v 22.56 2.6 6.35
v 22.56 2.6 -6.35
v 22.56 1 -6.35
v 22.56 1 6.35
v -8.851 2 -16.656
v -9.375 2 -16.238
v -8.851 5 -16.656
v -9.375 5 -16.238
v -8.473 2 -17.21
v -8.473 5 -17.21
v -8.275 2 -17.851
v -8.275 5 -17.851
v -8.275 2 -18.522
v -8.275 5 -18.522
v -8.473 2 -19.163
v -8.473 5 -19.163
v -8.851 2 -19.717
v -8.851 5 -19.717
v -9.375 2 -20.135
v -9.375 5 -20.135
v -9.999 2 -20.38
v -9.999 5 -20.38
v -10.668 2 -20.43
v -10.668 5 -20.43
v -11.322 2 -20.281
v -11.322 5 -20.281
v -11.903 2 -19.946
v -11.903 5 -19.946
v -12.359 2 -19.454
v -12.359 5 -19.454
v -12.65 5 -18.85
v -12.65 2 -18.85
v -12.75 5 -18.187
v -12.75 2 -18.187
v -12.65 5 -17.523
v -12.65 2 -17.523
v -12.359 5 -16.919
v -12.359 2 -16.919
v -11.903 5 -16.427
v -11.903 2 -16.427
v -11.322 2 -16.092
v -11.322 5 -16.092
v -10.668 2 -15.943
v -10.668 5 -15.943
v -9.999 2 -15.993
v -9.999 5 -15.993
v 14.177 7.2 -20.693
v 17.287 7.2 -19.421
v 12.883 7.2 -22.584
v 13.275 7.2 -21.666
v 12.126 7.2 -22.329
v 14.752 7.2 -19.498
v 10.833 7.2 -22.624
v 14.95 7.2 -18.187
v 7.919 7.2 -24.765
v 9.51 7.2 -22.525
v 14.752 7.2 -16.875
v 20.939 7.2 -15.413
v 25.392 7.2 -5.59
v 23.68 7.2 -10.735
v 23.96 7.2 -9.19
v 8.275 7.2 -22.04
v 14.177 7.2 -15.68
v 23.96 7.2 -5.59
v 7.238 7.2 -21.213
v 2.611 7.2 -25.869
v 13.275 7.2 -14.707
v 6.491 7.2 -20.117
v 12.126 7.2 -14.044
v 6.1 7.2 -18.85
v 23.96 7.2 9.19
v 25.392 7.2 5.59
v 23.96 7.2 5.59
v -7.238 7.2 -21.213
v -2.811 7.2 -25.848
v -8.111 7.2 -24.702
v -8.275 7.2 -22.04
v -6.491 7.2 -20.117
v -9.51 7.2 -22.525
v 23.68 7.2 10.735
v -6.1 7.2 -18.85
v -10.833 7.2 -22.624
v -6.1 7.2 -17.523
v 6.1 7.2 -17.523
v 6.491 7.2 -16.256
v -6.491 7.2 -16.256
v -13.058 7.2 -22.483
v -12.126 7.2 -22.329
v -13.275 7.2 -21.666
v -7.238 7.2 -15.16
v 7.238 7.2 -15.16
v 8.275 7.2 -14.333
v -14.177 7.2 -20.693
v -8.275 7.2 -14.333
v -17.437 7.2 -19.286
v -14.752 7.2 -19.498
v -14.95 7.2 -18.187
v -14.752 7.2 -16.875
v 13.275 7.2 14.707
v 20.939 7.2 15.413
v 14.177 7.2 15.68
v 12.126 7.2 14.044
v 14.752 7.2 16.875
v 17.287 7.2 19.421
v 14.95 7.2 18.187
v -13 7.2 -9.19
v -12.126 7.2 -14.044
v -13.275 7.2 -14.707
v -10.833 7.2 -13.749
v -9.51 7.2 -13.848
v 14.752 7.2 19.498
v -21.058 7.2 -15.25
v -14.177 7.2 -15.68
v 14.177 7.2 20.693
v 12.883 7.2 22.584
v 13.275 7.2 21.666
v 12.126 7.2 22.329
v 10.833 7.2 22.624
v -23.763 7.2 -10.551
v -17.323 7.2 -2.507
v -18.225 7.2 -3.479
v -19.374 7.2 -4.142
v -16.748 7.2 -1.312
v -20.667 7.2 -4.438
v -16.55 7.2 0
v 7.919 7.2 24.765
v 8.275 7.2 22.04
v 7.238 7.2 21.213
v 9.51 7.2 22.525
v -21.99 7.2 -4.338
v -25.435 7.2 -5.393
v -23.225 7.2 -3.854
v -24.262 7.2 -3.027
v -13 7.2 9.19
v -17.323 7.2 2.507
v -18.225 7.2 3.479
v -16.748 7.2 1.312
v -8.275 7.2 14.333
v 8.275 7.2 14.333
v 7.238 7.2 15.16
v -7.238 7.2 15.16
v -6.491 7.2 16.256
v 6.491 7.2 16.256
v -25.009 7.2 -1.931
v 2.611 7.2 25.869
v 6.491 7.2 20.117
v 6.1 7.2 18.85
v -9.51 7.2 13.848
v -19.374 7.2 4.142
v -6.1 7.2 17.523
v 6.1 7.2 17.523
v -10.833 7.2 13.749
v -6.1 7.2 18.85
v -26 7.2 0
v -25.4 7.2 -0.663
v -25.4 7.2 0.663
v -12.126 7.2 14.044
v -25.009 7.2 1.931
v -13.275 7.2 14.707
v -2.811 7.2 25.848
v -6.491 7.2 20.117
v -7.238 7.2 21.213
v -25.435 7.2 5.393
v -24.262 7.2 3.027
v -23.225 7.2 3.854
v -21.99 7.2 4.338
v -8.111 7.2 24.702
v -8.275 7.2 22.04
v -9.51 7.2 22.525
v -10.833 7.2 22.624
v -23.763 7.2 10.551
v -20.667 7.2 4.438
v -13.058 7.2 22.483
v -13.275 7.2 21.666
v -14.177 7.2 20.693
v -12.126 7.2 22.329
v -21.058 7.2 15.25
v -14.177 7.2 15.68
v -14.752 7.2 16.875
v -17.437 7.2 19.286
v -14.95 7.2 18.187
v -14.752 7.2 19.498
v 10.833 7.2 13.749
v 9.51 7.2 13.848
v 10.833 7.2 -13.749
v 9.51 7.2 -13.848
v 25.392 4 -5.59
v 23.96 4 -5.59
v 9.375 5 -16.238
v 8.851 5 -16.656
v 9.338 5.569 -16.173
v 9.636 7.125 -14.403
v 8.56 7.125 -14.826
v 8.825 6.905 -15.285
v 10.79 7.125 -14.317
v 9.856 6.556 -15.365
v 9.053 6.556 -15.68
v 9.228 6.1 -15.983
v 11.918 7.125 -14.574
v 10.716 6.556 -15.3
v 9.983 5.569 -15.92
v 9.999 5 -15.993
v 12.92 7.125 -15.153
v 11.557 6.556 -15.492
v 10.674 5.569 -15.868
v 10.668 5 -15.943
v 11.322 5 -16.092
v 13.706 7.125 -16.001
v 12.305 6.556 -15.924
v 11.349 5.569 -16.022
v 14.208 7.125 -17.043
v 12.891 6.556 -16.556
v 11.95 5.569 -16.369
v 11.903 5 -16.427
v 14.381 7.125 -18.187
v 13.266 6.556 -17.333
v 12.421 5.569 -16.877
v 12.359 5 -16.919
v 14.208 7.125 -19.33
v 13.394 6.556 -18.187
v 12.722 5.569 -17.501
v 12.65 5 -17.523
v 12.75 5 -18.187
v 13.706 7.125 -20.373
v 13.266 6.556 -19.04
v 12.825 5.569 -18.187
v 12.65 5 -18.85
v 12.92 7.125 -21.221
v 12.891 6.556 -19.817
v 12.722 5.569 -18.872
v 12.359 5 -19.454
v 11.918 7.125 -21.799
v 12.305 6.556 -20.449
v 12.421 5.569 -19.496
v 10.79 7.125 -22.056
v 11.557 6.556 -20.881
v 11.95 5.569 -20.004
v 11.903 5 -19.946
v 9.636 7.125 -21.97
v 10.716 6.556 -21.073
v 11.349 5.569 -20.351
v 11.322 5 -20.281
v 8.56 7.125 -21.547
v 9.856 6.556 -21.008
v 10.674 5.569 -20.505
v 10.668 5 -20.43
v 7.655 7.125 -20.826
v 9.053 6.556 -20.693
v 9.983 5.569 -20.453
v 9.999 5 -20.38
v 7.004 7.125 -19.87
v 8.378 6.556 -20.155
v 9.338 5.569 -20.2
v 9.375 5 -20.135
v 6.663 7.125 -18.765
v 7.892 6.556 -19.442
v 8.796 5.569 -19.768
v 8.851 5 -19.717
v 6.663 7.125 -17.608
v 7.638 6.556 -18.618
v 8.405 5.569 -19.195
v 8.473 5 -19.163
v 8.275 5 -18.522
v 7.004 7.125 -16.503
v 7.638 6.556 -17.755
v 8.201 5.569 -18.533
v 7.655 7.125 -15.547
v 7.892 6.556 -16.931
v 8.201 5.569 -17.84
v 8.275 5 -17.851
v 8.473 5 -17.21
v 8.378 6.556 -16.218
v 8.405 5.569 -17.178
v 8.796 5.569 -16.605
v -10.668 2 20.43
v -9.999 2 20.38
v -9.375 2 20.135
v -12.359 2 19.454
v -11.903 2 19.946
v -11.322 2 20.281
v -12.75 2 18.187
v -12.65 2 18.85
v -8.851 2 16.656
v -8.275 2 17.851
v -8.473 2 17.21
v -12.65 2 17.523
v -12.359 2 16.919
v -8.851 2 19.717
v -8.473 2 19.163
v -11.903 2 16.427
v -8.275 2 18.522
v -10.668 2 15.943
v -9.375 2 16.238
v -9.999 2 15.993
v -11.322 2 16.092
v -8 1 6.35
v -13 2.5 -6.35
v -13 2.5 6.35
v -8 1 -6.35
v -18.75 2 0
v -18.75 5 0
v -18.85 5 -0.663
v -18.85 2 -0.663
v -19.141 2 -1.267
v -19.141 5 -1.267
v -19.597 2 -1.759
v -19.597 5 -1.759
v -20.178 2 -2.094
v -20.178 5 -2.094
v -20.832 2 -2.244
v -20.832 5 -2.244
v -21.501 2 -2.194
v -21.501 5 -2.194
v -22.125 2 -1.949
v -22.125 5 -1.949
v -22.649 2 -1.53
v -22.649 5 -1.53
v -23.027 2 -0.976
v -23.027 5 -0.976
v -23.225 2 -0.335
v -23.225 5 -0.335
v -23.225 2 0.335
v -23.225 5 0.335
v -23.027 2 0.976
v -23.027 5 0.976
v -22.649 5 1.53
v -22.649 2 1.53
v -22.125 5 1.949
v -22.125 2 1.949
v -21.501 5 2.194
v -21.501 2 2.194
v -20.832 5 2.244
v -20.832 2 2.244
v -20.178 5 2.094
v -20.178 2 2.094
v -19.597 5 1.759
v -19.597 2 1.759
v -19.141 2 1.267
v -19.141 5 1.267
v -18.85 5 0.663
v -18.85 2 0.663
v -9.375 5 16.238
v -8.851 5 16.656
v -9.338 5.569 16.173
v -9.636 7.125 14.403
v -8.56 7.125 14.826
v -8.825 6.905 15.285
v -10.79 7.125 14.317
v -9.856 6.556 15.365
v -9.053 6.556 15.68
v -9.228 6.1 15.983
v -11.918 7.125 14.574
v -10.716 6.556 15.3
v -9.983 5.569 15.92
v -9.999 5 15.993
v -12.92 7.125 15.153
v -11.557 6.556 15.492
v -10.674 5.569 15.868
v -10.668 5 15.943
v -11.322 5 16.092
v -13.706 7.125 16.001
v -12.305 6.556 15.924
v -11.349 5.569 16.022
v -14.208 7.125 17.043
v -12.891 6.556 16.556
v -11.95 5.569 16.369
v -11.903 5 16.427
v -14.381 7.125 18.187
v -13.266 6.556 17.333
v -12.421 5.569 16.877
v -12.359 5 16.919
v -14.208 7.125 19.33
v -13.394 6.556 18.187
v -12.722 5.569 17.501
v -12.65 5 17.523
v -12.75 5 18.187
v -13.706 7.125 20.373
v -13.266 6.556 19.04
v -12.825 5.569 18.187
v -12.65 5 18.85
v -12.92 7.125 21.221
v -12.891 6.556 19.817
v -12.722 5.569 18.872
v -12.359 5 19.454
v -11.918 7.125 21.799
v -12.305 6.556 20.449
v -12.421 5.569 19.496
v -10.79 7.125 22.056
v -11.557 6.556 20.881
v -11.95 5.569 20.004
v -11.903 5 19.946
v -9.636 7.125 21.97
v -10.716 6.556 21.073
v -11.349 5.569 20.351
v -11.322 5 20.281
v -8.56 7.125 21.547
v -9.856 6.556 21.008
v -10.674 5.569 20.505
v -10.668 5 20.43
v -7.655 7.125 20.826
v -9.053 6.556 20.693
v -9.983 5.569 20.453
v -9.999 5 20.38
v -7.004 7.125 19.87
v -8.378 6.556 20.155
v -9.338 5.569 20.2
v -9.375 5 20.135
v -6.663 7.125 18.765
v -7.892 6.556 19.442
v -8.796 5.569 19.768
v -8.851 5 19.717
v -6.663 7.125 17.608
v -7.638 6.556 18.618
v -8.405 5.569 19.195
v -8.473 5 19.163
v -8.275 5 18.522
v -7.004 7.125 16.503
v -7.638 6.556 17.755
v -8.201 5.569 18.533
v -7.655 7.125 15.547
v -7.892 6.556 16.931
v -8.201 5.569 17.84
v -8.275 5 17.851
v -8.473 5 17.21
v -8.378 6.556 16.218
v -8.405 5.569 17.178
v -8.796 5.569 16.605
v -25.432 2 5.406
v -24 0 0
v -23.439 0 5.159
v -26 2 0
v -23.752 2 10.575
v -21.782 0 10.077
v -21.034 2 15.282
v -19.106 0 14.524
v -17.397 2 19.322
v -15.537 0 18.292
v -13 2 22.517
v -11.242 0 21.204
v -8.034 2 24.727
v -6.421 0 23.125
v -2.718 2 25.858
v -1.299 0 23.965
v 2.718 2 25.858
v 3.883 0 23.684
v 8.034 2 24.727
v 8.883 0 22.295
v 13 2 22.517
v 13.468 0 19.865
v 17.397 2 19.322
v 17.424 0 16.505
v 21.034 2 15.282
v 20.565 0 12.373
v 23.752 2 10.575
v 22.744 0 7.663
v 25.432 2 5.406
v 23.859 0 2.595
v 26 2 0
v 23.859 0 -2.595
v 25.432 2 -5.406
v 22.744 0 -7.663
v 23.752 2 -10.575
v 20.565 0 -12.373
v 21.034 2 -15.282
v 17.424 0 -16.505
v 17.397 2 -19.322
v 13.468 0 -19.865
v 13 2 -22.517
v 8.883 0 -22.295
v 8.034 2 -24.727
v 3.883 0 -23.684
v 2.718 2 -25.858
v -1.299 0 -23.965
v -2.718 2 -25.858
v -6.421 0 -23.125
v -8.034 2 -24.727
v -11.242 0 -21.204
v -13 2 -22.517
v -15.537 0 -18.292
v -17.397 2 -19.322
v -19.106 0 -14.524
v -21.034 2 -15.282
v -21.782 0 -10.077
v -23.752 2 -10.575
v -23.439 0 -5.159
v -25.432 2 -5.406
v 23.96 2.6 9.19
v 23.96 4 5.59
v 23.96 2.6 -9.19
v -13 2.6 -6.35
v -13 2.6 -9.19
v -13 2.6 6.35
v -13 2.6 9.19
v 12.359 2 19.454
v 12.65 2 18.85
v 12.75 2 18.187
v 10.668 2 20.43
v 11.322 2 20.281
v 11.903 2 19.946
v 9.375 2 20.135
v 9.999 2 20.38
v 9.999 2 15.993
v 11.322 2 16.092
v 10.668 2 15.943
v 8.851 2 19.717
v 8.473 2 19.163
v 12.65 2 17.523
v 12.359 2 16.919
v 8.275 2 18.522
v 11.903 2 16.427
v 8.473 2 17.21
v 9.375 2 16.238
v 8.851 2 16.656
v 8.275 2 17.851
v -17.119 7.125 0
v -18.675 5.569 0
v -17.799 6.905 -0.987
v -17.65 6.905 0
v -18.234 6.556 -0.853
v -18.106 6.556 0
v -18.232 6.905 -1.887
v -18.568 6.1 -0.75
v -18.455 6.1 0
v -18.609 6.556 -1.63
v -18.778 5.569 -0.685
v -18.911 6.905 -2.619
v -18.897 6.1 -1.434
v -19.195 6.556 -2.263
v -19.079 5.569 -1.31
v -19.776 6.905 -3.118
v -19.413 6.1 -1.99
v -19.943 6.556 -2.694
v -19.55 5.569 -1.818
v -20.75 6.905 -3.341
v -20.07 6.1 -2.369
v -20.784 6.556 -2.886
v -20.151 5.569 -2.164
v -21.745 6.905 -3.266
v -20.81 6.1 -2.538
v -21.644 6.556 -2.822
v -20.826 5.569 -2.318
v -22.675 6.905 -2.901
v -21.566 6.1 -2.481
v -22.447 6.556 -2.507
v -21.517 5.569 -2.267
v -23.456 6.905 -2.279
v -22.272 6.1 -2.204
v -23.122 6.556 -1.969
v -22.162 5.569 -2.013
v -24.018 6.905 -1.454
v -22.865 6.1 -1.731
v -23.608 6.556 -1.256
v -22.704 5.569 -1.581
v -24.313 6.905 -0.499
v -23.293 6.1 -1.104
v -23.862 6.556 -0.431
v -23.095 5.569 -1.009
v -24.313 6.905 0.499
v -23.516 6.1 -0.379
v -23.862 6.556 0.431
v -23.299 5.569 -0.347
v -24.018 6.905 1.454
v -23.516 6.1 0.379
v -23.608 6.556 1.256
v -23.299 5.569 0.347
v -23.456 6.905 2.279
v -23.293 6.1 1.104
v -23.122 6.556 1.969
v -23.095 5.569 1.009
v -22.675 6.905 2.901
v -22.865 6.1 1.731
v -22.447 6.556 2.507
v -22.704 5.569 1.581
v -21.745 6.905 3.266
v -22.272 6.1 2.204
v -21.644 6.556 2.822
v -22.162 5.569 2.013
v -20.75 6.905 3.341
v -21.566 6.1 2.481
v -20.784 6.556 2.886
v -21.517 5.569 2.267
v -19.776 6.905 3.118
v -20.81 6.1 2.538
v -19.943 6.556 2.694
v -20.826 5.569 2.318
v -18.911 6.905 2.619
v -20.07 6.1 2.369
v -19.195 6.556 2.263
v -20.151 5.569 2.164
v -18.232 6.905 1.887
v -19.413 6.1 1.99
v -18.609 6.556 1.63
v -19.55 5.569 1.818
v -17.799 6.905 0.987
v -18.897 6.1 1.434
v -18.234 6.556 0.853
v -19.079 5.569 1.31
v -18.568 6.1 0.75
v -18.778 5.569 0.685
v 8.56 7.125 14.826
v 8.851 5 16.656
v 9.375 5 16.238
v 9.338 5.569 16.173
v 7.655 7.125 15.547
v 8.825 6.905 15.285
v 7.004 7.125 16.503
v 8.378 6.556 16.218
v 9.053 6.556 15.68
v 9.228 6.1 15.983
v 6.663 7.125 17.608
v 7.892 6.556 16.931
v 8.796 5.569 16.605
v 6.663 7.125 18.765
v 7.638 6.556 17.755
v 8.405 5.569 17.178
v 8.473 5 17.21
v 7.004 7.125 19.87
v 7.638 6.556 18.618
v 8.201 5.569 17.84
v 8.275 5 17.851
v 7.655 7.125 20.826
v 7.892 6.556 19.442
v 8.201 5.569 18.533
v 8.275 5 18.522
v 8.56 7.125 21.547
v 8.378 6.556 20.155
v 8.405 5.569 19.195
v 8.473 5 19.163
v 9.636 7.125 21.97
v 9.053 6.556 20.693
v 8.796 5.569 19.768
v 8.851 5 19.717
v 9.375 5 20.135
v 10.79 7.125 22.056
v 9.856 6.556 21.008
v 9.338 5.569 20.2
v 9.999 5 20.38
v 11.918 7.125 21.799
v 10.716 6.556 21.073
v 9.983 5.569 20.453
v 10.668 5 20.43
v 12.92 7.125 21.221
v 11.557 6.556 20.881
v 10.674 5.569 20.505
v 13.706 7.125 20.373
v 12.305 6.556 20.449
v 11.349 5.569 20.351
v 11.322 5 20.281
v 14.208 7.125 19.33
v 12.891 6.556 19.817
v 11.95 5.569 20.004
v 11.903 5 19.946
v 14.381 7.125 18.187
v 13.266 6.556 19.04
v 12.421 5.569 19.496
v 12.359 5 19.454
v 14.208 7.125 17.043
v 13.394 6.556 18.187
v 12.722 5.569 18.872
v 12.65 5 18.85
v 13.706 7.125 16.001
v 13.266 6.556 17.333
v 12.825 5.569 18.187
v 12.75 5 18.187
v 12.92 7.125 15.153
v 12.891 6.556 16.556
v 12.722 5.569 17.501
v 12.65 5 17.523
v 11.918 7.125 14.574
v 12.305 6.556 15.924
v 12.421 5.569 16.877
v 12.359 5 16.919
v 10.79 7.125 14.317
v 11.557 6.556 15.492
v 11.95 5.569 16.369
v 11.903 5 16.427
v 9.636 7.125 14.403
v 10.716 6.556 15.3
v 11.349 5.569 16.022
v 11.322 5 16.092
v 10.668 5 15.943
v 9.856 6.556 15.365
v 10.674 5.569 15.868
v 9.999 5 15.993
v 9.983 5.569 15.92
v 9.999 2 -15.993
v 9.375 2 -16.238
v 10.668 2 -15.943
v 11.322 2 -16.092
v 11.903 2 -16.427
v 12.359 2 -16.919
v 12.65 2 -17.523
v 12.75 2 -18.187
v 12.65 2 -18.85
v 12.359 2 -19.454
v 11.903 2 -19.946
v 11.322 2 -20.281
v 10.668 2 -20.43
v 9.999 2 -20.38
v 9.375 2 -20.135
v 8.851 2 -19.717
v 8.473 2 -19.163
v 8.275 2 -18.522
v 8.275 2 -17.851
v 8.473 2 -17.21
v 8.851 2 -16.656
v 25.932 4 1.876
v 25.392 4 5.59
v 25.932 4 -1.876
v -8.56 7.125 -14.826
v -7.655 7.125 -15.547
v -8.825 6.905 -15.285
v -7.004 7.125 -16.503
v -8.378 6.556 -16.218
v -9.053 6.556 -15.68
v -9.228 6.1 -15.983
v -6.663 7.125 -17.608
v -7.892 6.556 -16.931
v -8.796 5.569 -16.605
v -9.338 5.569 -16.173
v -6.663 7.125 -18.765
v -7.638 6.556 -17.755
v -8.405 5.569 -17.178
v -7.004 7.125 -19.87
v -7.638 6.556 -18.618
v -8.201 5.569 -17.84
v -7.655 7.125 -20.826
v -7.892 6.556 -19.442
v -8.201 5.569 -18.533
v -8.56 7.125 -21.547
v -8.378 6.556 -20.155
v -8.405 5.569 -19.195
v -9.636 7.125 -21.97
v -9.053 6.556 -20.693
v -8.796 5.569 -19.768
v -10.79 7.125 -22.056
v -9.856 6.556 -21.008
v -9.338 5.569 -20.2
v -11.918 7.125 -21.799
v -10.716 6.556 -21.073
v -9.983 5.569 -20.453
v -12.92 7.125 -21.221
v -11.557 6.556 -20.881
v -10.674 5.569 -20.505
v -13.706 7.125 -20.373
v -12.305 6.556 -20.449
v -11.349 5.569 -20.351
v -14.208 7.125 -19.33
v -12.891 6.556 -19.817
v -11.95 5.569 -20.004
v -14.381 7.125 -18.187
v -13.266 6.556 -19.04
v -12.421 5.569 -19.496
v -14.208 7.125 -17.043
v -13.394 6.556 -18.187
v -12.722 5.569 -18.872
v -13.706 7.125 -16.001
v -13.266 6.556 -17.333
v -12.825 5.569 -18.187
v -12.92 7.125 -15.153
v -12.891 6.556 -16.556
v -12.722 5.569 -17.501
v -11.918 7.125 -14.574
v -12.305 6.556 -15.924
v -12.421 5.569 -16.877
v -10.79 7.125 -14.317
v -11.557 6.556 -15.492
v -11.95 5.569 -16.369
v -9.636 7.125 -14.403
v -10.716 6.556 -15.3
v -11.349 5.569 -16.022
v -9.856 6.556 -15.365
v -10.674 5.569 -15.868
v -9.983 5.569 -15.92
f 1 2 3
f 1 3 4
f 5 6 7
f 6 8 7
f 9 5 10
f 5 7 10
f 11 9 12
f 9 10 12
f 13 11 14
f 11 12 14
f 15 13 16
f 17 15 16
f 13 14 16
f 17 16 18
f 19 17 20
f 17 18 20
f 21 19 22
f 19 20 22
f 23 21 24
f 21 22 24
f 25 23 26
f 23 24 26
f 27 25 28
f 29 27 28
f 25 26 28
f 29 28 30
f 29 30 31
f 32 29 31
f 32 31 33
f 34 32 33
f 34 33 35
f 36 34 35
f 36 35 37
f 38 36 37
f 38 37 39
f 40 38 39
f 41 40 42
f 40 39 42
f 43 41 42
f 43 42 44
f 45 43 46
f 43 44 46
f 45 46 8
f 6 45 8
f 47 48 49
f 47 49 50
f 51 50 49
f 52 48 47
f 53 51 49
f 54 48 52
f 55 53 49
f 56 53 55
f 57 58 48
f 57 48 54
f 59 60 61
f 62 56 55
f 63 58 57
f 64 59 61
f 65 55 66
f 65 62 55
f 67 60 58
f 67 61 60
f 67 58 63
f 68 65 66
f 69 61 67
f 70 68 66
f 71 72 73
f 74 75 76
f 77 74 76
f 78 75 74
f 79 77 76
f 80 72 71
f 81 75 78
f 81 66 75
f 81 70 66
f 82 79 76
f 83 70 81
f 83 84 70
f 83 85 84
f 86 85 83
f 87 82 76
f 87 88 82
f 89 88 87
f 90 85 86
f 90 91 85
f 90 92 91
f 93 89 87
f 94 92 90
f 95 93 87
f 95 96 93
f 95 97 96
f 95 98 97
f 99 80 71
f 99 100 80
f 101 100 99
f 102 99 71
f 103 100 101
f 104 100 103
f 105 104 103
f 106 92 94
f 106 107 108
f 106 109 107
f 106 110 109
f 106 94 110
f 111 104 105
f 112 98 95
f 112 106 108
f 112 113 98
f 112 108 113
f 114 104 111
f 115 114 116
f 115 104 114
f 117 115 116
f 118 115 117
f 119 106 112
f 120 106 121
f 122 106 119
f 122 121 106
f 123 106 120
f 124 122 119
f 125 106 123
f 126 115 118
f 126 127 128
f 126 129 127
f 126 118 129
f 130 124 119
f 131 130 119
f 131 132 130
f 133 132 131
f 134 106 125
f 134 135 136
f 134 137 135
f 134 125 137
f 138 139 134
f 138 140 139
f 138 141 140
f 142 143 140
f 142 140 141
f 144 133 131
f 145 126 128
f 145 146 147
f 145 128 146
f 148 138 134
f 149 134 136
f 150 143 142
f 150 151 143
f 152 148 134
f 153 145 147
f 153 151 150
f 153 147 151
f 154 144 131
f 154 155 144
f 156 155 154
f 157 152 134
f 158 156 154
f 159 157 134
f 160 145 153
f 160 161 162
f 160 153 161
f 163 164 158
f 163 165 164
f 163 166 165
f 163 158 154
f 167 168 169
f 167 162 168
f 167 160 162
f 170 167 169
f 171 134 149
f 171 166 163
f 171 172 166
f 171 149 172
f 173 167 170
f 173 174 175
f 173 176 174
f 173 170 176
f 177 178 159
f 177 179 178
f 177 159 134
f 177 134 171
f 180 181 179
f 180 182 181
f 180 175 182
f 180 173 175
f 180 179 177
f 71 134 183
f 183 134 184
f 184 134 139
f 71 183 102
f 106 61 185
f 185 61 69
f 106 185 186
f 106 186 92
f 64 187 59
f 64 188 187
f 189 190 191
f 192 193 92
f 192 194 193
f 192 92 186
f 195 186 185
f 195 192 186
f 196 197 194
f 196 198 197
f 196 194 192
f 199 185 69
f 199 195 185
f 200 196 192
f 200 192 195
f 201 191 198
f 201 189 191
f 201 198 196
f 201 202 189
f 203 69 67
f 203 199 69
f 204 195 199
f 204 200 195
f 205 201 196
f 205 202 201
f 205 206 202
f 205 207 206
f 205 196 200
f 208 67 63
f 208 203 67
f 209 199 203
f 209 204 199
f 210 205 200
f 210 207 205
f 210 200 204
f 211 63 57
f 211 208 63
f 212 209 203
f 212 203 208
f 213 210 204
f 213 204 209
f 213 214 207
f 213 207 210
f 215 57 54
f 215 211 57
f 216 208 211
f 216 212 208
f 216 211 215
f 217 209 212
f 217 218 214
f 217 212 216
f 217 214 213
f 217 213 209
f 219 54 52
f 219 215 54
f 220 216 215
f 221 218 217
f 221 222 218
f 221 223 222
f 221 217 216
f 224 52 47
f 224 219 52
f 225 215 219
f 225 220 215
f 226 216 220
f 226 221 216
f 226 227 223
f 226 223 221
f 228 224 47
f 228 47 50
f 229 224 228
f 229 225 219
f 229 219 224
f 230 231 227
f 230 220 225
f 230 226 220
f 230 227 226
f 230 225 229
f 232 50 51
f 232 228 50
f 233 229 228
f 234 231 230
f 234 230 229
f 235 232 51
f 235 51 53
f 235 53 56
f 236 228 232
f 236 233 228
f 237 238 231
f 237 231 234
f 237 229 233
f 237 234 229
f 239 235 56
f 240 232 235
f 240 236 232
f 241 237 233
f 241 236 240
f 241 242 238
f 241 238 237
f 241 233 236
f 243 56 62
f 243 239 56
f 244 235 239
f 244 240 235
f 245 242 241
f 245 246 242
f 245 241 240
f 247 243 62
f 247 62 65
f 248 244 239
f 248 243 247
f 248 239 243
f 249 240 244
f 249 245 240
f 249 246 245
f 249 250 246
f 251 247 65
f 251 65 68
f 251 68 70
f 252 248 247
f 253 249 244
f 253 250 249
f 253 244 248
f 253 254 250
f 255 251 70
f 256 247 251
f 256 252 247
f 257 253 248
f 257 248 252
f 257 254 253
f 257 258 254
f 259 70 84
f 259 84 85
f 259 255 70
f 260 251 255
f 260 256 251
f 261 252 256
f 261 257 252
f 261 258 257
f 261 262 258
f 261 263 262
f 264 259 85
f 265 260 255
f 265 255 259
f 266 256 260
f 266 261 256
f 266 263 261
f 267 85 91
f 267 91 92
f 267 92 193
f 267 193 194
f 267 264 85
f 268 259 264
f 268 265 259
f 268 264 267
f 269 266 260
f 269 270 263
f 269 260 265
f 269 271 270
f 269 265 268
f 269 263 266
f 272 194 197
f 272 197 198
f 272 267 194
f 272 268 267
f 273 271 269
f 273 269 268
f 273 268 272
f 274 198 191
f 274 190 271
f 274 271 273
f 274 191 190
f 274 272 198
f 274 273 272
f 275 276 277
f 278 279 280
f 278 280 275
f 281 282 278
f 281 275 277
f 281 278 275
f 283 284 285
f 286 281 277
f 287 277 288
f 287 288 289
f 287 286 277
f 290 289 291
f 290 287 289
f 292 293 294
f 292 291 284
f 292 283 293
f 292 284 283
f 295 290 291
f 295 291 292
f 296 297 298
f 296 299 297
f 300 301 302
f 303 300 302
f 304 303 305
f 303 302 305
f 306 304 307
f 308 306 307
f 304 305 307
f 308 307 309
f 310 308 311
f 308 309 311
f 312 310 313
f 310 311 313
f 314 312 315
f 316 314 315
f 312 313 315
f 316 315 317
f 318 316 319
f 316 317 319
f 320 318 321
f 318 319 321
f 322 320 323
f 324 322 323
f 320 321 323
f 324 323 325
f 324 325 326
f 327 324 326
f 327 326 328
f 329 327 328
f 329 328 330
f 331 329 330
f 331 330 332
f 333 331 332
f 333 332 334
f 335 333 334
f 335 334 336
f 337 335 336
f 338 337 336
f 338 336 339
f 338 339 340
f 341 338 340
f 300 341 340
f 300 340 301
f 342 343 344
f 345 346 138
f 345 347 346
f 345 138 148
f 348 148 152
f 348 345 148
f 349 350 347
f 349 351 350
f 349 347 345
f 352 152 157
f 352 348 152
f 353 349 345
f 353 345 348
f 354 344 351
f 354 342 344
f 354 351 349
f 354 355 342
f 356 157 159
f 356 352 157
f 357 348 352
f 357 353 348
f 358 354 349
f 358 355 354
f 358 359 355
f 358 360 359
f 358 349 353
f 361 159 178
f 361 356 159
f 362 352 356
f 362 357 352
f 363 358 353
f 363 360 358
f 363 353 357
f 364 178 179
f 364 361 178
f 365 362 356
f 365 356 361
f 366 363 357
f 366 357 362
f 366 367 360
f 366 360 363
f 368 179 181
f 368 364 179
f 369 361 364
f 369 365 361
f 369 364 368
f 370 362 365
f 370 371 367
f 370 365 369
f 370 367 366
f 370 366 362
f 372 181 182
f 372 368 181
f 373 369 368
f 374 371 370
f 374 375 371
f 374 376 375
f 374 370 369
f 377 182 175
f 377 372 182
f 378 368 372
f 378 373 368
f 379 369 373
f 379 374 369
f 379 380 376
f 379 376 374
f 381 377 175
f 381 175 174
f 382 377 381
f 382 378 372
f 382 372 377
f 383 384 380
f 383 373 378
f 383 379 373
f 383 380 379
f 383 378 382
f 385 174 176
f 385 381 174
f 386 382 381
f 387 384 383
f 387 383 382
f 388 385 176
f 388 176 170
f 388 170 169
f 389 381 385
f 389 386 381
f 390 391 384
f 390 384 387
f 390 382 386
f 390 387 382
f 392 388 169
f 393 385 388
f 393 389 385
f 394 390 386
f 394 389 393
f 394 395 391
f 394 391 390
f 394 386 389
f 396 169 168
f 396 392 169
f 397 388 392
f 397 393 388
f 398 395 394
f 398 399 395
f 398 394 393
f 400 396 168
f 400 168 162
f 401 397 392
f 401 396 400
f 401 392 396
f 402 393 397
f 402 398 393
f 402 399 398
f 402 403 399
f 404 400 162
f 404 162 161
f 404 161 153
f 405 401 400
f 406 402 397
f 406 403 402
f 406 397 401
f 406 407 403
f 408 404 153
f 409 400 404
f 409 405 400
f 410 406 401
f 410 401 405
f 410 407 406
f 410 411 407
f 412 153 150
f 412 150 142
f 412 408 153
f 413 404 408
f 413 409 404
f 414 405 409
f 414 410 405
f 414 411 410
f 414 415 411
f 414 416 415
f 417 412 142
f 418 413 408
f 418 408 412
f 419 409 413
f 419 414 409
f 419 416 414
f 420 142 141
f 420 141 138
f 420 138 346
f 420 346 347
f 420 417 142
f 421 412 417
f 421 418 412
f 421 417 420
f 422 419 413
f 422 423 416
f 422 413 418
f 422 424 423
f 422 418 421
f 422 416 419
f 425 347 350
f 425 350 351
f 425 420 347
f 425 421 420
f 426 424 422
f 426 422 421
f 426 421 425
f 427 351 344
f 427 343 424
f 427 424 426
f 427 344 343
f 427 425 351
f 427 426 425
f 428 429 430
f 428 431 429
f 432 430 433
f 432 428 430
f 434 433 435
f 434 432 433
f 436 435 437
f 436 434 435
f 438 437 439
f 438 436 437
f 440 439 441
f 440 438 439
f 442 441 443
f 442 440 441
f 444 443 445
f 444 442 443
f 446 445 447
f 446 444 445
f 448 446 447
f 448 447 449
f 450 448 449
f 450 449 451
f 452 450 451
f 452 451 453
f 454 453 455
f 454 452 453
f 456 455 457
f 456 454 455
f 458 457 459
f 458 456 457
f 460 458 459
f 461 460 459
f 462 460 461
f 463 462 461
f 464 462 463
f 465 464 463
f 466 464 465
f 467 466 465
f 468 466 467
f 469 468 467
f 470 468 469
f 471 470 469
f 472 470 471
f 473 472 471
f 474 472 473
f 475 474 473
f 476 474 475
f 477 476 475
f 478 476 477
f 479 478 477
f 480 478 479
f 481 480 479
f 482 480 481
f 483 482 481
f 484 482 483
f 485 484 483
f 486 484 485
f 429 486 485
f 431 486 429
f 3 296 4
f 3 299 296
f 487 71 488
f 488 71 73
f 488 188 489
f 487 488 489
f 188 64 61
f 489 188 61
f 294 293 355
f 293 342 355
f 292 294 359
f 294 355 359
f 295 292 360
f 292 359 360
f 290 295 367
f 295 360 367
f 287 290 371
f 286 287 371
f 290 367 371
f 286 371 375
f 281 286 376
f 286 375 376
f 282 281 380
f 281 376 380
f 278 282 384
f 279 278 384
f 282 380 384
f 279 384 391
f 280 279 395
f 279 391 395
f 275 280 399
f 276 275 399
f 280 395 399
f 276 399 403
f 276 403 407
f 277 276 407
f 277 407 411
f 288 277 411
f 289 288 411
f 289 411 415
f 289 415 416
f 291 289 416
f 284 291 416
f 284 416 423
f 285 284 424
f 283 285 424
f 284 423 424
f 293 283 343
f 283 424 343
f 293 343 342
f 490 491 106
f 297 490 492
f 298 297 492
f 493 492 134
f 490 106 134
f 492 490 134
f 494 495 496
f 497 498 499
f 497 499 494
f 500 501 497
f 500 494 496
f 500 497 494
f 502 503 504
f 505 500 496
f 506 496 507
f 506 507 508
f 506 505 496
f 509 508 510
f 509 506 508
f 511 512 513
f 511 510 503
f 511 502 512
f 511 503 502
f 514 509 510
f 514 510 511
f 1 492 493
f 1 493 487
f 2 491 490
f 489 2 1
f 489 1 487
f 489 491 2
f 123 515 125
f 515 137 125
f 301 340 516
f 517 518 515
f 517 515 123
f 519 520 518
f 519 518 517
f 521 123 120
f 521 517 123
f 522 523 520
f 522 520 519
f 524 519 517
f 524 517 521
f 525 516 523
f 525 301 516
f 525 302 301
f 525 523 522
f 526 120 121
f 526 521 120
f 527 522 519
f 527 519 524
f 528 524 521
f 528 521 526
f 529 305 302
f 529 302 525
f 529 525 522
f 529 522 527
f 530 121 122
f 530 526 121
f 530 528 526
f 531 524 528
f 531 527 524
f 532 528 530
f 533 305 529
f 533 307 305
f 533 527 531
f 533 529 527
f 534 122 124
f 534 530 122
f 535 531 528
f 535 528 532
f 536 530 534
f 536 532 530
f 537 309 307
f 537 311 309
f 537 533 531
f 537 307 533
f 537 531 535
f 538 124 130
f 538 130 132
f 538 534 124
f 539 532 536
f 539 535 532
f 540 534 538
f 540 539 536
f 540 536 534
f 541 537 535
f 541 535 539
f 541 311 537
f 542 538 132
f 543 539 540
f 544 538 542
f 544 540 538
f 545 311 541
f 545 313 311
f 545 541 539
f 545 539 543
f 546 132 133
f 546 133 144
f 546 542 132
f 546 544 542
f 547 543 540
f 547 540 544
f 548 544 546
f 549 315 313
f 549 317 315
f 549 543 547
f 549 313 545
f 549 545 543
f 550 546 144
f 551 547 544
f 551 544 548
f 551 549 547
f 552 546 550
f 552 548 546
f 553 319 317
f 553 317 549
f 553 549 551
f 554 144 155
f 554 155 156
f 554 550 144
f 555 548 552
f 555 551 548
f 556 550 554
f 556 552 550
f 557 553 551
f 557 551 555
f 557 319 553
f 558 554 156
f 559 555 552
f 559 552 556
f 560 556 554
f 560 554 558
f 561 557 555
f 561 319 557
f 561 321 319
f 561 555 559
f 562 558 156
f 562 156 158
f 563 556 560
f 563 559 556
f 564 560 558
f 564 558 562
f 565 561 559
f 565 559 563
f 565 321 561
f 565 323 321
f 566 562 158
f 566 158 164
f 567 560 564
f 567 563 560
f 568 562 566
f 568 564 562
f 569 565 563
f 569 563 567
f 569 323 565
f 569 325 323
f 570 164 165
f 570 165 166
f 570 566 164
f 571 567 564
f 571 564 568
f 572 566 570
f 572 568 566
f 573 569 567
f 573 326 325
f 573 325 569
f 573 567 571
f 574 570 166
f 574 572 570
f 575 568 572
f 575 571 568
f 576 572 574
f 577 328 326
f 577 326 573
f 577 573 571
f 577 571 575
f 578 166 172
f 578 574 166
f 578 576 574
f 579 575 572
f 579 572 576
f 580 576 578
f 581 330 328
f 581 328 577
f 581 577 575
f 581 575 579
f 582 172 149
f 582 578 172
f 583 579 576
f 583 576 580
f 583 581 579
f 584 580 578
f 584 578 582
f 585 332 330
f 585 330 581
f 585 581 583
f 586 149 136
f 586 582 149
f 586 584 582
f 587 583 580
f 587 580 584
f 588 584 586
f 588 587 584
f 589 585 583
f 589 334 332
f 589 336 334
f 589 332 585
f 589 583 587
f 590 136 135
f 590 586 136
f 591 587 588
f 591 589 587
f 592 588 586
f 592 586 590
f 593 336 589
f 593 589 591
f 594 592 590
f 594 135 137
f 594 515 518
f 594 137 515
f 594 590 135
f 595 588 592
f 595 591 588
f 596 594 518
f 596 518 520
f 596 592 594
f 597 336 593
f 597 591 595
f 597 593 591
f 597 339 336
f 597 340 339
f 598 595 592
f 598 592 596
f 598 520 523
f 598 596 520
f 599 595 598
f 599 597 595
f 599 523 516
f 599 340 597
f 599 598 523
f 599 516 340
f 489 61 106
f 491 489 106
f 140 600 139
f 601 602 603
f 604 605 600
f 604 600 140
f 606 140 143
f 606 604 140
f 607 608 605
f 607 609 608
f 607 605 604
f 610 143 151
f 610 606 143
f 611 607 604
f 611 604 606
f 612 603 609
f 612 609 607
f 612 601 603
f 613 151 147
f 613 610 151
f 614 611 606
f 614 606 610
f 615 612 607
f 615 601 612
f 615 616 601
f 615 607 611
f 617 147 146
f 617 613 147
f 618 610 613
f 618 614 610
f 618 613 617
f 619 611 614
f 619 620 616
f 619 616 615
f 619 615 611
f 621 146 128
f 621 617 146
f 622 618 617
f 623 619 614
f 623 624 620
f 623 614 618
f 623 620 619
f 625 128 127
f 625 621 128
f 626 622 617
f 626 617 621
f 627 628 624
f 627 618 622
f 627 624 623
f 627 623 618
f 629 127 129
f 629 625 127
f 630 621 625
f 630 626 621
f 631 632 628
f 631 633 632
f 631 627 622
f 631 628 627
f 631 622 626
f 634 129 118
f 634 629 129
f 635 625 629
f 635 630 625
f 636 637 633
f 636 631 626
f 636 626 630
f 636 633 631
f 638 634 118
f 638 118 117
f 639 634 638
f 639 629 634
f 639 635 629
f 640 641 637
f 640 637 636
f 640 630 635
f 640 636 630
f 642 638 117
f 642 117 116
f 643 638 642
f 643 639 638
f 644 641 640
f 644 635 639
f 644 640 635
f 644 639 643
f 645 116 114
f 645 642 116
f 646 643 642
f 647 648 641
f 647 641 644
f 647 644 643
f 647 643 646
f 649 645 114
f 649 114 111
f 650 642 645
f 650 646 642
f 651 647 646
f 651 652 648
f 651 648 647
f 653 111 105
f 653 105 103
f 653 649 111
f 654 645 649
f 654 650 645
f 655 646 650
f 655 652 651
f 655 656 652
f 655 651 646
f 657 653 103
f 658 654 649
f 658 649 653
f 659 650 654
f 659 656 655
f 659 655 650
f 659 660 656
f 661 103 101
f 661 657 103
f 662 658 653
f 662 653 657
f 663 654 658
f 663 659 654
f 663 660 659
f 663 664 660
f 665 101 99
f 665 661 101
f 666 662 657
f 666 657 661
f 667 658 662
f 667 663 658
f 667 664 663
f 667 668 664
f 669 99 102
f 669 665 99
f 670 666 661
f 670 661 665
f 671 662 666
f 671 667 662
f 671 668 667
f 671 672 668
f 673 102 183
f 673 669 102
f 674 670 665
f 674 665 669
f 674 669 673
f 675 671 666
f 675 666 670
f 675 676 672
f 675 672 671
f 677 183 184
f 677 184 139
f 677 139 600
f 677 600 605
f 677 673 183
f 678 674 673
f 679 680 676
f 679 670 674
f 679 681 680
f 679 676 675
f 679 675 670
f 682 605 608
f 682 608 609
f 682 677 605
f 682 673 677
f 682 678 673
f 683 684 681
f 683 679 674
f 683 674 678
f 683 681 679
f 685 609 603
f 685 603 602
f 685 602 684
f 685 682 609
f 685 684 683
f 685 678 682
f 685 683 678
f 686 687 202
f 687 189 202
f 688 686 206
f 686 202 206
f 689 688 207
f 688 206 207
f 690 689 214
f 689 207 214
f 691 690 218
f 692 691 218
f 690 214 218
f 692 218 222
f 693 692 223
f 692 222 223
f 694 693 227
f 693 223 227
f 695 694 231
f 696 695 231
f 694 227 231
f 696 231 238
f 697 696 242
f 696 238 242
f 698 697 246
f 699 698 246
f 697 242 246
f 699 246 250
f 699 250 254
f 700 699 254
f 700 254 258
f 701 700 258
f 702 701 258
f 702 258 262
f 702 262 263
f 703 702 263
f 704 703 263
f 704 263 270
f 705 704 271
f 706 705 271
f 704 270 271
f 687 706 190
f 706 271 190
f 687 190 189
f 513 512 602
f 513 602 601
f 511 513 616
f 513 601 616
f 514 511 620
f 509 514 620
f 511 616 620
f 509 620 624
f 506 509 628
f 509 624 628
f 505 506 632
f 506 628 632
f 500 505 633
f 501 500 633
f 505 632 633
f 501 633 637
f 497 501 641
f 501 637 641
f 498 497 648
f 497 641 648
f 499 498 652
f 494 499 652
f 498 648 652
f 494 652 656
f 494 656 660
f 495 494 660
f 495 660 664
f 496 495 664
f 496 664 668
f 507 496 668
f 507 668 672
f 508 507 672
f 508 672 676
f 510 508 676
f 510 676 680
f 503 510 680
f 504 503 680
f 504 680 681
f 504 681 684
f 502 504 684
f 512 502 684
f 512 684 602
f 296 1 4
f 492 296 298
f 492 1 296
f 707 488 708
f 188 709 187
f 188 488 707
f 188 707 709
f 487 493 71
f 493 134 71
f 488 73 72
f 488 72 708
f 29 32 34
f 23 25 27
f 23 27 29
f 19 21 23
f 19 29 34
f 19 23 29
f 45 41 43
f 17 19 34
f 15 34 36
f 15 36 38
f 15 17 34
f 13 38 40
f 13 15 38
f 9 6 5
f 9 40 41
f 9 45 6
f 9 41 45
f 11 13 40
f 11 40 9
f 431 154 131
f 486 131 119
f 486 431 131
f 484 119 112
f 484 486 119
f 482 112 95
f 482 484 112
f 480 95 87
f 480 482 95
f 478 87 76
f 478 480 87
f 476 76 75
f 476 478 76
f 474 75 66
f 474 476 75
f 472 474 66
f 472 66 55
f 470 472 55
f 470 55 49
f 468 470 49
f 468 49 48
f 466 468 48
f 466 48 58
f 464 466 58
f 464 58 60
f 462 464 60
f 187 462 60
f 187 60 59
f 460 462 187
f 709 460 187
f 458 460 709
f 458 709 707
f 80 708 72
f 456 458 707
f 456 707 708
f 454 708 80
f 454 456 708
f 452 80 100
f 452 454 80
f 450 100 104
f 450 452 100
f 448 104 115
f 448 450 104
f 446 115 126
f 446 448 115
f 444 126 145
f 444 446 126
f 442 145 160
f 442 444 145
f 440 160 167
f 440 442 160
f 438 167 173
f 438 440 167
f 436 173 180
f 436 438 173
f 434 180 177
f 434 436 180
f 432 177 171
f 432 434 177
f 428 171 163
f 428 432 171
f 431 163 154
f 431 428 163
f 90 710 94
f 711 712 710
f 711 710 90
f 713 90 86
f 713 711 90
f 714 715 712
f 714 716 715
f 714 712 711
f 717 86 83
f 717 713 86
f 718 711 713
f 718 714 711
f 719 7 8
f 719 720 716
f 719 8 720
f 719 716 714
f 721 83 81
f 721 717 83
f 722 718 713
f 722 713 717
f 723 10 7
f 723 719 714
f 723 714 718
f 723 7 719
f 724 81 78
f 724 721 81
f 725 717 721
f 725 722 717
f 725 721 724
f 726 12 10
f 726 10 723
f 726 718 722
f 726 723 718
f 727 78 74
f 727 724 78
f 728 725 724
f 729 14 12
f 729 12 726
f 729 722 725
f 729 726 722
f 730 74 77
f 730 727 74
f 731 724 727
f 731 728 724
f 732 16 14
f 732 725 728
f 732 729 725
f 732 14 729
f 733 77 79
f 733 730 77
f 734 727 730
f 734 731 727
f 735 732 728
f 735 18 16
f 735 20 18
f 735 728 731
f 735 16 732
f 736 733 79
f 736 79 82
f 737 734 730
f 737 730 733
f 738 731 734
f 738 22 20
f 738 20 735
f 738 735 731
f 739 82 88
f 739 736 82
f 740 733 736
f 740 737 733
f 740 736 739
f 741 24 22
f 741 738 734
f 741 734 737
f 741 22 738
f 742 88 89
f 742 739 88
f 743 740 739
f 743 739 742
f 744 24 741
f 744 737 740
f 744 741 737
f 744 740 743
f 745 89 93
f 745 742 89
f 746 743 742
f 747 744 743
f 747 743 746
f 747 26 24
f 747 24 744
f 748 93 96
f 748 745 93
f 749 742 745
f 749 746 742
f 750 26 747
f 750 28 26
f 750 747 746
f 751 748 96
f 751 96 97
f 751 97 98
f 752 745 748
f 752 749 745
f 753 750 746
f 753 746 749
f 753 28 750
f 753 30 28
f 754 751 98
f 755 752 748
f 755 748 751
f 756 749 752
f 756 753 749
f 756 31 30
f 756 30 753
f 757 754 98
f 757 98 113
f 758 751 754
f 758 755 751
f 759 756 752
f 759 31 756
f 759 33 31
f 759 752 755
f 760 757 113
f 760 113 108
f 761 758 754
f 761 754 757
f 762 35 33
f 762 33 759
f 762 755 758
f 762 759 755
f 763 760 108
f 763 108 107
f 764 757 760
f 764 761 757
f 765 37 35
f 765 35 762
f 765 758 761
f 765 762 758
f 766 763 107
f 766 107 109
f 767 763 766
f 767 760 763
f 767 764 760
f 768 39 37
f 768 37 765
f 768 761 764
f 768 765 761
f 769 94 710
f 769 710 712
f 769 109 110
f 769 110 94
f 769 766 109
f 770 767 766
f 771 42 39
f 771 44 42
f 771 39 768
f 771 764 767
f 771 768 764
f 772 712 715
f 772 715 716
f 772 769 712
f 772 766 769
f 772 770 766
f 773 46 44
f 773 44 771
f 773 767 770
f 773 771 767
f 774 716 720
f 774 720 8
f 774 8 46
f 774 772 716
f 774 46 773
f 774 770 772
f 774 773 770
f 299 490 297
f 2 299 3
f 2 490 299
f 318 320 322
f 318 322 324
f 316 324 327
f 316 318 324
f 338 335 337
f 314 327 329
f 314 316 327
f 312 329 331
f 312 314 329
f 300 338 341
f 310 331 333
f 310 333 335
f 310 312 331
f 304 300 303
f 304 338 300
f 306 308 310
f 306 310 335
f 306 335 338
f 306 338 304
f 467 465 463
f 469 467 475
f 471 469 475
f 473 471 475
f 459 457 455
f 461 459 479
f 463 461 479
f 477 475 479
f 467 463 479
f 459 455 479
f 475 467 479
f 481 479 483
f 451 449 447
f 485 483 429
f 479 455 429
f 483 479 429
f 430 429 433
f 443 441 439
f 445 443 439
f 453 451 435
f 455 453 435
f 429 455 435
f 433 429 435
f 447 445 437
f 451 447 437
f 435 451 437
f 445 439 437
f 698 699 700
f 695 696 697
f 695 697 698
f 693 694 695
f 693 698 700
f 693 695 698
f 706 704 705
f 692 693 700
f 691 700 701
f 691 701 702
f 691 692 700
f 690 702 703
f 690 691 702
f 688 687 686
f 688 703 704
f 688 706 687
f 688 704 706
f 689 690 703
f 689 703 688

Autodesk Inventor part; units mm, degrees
ref_plane "YZ Plane" through (0, 0, 0) normal (1, 0, 0) x (0, 1, 0)
ref_plane "XZ Plane" through (0, 0, 0) normal (0, 1, 0) x (-1, 0, 0)
ref_plane "XY Plane" through (0, 0, 0) normal (0, 0, 1) x (1, 0, 0)
sketch "Sketch1" plane through (0, 0, 0) normal (0, 1, 0) x (-1, 0, 0)
  circle A0 centre (0, 0) radius 26
  dimension "d0" = 52
extrude "Extrusion1" add sketch "Sketch1" along normal blind 7.2
chamfer "Chamfer2" distance 2 angle 45 1 edges at (26, 0, 0)
sketch "Sketch2" plane through (0, 7.2, 0) normal (0, 1, 0) x (1, 0, 0)
  line L0 (-13, -9.19) -> (23.96, -9.19)
  line L1 (23.96, -9.19) -> (23.96, 9.19)
  line L2 (23.96, 9.19) -> (-13, 9.19)
  line L3 (-13, 9.19) -> (-13, -9.19)
  point P0 (0, 0)
  dimension "d5" = 36.96
  dimension "d6" = 18.38
  dimension "d7" = 9.19
  dimension "d8" = 13
extrude "Extrusion2" cut sketch "Sketch2" against normal blind 4.6
sketch "Sketch3" plane through (23.96, 7.2, -9.19) normal (-1, 0, 0) x (0, 0, 1)
  line L0 (3.6, 0) -> (14.78, 0)
  line L1 (14.78, 0) -> (14.78, -3.2)
  line L2 (14.78, -3.2) -> (3.6, -3.2)
  line L3 (3.6, -3.2) -> (3.6, 0)
  line L4 (0, 0) -> (18.38, 0) projected
  line L5 (0, -4.6) -> (18.38, -4.6) projected
  line L6 (0, 0) -> (0, -4.6) projected
  line L7 (18.38, 0) -> (18.38, -4.6) projected
  point P0 (9.19, -7.2)
  dimension "d11" = 0
  dimension "d14" = 3.6
  dimension "d44" = 3.6
  dimension "d47" = 1.4
extrude "Extrusion3" cut sketch "Sketch3" against normal through all contours L0 L1 L2 L3
ref_plane "Work Plane1" through (-13, 7.2, 0) normal (0, 0, 1) x (1, 0, 0)
sketch "Sketch7" plane through (0, 2.6, 0) normal (0, 1, 0) x (1, 0, 0)
  line L0 (-13, 6.35) -> (22.56, 6.35)
  line L1 (22.56, 6.35) -> (22.56, -6.35)
  line L2 (22.56, -6.35) -> (-13, -6.35)
  line L3 (-13, -6.35) -> (-13, 6.35)
  line L4 (36.4, 0) -> (-36.4, 0) projected
  line L5 (-13, -9.19) -> (-13, 9.19) projected
  point P0 (0, 0)
  dimension "d28" = 12.7
  dimension "d29" = 35.56
  dimension "d30" = 6.35
  dimension "d31" = 0
extrude "Extrusion5" cut sketch "Sketch7" against normal blind 1.6
sketch "Sketch4" plane through (0, 7.2, 0) normal (0, 1, 0) x (1, 0, 0)
  circle A0 centre (-21, 0) radius 2.25
  arc A1 (25.392, 5.59) -> (25.392, -5.59) centre (0, 0) ccw projected
  point P0 (24.6995, 8.12)
  point P1 (24.6995, -8.12)
  dimension "d17" = 4.5
  dimension "d23" = 21
extrude "Extrusion4" cut sketch "Sketch4" against normal blind 5.2
fillet "Fillet4" radius 2.2 1 edges at (-23.25, 7.2, 0)
pattern_circular "Circular Pattern2" count 5 over 240 about axis through (0, 7.2, 0) along (0, 1, 0) of "Extrusion4", "Fillet4" both ways yes
chamfer "Chamfer3" distance 1.5 distance2 5 1 edges at (-13, 1, 0) measured on face at (-13, 5.6667, -2.1167)
equation "\"d7\" = 0.5 * d6"
equation "\"d44\" = d14"
equation "\"d30\" = 0.5 * d28"
equation "\"d24\" = 0.5 * d6"
properties part number "_3DPrint"
